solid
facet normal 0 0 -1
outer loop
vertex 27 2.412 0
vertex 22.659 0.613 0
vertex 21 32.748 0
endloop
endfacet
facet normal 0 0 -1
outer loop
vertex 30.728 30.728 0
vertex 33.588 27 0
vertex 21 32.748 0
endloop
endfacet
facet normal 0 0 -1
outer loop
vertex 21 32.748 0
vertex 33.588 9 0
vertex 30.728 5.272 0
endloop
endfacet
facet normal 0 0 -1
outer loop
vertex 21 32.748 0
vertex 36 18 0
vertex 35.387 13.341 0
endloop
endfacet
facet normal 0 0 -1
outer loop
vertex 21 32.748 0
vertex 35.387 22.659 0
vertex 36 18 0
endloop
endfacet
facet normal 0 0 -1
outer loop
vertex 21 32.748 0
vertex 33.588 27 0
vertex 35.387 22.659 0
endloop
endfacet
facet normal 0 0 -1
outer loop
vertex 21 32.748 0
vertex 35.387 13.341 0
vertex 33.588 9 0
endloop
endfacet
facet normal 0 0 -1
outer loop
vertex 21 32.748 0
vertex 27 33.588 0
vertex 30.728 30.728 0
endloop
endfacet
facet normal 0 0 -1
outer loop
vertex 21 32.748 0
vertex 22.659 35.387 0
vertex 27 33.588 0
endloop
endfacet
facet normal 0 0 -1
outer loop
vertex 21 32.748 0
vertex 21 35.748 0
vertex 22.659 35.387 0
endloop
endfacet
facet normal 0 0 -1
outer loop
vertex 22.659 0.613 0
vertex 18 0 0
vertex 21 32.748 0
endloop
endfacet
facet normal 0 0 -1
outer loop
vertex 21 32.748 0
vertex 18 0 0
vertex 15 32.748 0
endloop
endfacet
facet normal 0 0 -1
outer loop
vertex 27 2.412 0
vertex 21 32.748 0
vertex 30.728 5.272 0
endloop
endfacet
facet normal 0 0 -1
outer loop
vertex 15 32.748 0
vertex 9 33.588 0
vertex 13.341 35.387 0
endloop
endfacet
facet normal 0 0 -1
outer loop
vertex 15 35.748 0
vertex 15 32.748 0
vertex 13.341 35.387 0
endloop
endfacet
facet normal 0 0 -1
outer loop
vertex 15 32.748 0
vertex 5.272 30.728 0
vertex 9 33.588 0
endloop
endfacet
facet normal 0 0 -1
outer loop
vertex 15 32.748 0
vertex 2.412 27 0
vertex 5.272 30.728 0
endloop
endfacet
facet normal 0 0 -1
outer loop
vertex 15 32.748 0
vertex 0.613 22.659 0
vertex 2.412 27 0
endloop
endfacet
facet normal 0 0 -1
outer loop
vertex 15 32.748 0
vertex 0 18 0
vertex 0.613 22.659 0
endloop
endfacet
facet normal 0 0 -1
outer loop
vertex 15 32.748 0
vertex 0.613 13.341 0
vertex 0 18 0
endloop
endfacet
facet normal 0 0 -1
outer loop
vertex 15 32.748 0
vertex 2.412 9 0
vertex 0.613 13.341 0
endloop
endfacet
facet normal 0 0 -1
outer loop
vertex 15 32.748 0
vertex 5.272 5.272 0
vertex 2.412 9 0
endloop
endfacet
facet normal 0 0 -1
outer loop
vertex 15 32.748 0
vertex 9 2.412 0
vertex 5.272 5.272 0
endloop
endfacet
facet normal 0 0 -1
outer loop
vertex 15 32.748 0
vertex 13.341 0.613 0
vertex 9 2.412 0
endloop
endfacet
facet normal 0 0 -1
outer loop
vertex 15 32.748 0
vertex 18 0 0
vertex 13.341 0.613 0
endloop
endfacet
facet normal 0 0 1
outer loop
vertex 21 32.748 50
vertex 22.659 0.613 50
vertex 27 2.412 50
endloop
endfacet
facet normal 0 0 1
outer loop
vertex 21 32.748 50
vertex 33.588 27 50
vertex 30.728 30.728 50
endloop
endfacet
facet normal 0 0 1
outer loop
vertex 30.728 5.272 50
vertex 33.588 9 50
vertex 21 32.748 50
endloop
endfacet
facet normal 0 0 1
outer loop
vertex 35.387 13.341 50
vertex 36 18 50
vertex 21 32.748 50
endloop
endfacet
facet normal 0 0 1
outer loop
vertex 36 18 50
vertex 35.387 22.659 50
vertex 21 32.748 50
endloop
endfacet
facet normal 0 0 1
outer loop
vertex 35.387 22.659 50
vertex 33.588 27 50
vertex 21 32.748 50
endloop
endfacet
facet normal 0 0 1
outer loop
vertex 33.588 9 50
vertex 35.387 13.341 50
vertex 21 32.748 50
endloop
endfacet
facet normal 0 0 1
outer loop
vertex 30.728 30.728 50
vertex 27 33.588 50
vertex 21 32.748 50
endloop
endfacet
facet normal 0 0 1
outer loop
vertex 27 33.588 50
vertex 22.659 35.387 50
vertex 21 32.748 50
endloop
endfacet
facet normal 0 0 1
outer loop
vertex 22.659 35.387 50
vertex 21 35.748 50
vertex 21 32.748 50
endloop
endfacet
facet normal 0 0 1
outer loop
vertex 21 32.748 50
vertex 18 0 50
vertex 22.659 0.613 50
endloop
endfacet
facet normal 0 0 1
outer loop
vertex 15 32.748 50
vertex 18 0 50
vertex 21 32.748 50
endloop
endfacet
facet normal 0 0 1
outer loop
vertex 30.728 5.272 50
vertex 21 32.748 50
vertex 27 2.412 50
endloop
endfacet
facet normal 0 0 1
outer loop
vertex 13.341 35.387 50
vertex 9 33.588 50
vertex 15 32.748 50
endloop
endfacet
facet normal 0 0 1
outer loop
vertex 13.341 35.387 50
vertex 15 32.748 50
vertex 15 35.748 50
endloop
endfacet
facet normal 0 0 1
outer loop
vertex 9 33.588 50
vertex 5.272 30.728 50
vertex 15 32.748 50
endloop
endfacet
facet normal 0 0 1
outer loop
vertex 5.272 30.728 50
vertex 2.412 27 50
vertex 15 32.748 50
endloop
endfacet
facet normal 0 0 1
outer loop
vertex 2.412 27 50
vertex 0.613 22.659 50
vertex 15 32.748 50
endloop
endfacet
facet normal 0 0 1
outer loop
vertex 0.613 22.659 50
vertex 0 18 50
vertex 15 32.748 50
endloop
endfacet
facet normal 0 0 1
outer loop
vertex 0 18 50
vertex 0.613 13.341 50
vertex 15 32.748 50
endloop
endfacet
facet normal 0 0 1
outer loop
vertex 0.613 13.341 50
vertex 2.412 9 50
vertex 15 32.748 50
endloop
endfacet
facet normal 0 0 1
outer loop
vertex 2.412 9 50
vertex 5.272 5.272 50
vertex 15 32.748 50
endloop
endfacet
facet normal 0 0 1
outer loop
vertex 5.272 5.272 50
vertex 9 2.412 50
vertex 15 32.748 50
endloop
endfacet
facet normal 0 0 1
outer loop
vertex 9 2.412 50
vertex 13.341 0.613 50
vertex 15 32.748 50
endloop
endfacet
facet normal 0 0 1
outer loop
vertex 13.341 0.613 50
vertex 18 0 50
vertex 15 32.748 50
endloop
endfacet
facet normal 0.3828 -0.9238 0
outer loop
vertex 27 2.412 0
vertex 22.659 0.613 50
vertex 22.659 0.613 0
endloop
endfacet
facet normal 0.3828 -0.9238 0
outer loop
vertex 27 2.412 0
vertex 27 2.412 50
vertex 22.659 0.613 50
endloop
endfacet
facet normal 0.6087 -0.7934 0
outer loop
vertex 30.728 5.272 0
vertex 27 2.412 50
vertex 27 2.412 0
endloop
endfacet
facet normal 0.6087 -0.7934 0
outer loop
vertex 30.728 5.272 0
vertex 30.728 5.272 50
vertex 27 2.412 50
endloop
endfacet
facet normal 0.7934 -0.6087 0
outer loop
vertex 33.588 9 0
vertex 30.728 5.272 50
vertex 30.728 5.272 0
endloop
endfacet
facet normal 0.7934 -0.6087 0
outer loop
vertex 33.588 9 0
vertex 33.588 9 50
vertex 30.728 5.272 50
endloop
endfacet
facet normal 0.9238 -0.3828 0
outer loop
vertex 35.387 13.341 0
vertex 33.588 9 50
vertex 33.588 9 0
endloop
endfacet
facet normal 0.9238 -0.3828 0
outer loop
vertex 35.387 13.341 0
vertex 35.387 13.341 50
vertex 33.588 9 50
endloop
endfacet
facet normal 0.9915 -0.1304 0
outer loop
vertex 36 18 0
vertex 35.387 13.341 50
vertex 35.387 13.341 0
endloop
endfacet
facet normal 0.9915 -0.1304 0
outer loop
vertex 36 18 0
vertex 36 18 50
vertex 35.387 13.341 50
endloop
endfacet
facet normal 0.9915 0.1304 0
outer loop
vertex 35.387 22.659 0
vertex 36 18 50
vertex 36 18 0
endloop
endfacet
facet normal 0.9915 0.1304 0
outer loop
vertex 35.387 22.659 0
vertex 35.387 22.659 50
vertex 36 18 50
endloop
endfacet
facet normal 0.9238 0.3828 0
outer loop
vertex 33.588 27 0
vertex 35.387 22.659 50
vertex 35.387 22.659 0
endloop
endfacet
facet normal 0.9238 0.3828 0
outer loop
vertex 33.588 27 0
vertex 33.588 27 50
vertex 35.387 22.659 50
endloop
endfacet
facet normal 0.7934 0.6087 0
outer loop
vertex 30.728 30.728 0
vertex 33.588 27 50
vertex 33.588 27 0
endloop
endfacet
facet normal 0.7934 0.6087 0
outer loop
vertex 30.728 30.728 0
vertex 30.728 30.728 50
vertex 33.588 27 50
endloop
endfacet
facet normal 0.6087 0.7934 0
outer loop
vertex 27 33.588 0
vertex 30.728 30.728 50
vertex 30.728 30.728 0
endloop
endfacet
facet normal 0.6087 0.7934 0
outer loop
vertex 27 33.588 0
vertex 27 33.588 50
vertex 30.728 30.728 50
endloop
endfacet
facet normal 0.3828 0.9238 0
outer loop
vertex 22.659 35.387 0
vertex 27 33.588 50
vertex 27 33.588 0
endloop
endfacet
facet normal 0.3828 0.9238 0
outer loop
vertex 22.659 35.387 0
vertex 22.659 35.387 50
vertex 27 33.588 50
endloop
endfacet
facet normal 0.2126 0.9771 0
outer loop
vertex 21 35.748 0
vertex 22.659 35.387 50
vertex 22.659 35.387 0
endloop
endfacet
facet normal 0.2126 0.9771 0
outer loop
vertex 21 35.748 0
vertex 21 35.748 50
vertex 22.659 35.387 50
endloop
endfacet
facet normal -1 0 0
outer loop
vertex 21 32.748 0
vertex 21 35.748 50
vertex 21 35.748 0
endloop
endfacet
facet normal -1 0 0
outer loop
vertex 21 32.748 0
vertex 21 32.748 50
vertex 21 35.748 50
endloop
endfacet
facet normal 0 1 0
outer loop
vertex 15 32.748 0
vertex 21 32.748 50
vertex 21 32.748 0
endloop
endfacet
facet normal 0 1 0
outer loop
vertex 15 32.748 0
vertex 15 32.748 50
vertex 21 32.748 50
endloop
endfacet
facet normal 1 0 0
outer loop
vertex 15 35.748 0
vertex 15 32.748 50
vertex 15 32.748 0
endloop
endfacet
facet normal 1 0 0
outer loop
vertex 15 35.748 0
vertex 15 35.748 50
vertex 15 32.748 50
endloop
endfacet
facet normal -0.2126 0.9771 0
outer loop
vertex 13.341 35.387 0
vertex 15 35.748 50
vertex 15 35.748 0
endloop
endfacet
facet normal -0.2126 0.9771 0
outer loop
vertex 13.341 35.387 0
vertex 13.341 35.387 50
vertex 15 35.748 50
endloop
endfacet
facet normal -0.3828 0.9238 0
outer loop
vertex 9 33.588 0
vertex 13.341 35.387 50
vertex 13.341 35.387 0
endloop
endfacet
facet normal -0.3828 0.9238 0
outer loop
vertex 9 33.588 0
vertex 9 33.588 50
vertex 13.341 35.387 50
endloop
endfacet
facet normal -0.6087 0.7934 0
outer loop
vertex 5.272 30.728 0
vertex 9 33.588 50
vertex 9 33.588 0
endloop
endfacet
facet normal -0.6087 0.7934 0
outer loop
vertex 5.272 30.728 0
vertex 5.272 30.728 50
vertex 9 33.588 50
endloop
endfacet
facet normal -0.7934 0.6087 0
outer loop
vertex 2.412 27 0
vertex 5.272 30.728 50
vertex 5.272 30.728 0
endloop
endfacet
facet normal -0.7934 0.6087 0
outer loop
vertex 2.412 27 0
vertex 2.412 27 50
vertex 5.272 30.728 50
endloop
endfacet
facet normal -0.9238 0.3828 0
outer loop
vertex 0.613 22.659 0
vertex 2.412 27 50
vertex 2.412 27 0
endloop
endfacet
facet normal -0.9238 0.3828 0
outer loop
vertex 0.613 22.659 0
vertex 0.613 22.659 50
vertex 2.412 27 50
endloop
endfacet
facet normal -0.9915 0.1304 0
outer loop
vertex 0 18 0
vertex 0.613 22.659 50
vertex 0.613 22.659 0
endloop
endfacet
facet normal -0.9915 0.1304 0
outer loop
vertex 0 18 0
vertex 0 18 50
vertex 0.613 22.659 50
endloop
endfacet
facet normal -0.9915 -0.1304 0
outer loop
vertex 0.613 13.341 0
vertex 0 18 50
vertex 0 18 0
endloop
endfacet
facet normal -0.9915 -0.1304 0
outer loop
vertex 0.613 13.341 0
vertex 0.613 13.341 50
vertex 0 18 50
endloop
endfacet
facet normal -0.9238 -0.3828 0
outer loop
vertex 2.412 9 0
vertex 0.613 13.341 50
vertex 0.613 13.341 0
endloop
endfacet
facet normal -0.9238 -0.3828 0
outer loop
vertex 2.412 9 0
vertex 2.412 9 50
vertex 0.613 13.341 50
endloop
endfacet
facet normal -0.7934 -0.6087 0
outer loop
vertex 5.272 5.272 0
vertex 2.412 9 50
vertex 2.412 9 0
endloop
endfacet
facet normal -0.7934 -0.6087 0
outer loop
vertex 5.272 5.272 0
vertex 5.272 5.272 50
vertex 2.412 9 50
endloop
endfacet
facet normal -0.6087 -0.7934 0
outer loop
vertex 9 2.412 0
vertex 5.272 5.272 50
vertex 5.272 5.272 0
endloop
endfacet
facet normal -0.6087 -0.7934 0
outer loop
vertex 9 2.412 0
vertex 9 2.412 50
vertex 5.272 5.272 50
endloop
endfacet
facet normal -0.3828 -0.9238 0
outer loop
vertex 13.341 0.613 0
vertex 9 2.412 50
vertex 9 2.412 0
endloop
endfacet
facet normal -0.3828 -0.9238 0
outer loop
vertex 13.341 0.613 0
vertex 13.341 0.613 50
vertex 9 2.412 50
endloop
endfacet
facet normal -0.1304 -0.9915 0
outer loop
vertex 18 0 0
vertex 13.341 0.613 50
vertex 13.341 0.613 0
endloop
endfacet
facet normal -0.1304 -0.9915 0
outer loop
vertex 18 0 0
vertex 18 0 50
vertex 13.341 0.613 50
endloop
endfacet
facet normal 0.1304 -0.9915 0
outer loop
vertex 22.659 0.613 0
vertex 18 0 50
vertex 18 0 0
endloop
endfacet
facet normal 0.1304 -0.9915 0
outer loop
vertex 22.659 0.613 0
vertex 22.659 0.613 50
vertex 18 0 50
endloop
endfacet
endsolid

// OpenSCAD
$fn = 32;

// ----------------------------------------------------------------------
// Keyway shaft: d36 shaft, key 6 x 3 mm
// ----------------------------------------------------------------------

// --- parameters (mm) ---
shaft_r = 18;             // shaft radius
key_w = 6;                // keyway width
key_d = 3;                // keyway depth below the surface line
plate_t = 50;             // shaft length, Z (extrusion height)
fit_tol = 0.02;           // declared fit tolerance (prompt contract)
free_tol = 0.2;           // declared free tolerance (prompt contract)

shaft_d = 2 * shaft_r;  // shaft diameter
circle_step = 15;  // polygon sampling step, degrees

profile = [[13.341, 35.387], [9, 33.588], [5.272, 30.728], [2.412, 27], [0.613, 22.659], [0, 18], [0.613, 13.341], [2.412, 9], [5.272, 5.272], [9, 2.412], [13.341, 0.613], [18, 0], [22.659, 0.613], [27, 2.412], [30.728, 5.272], [33.588, 9], [35.387, 13.341], [36, 18], [35.387, 22.659], [33.588, 27], [30.728, 30.728], [27, 33.588], [22.659, 35.387], [21, 35.748], [21, 32.748], [15, 32.748], [15, 35.748]];  // primary outline, 27 points, counter clockwise

// --- the one profile operation ---
linear_extrude(height = plate_t) polygon(points = profile);
